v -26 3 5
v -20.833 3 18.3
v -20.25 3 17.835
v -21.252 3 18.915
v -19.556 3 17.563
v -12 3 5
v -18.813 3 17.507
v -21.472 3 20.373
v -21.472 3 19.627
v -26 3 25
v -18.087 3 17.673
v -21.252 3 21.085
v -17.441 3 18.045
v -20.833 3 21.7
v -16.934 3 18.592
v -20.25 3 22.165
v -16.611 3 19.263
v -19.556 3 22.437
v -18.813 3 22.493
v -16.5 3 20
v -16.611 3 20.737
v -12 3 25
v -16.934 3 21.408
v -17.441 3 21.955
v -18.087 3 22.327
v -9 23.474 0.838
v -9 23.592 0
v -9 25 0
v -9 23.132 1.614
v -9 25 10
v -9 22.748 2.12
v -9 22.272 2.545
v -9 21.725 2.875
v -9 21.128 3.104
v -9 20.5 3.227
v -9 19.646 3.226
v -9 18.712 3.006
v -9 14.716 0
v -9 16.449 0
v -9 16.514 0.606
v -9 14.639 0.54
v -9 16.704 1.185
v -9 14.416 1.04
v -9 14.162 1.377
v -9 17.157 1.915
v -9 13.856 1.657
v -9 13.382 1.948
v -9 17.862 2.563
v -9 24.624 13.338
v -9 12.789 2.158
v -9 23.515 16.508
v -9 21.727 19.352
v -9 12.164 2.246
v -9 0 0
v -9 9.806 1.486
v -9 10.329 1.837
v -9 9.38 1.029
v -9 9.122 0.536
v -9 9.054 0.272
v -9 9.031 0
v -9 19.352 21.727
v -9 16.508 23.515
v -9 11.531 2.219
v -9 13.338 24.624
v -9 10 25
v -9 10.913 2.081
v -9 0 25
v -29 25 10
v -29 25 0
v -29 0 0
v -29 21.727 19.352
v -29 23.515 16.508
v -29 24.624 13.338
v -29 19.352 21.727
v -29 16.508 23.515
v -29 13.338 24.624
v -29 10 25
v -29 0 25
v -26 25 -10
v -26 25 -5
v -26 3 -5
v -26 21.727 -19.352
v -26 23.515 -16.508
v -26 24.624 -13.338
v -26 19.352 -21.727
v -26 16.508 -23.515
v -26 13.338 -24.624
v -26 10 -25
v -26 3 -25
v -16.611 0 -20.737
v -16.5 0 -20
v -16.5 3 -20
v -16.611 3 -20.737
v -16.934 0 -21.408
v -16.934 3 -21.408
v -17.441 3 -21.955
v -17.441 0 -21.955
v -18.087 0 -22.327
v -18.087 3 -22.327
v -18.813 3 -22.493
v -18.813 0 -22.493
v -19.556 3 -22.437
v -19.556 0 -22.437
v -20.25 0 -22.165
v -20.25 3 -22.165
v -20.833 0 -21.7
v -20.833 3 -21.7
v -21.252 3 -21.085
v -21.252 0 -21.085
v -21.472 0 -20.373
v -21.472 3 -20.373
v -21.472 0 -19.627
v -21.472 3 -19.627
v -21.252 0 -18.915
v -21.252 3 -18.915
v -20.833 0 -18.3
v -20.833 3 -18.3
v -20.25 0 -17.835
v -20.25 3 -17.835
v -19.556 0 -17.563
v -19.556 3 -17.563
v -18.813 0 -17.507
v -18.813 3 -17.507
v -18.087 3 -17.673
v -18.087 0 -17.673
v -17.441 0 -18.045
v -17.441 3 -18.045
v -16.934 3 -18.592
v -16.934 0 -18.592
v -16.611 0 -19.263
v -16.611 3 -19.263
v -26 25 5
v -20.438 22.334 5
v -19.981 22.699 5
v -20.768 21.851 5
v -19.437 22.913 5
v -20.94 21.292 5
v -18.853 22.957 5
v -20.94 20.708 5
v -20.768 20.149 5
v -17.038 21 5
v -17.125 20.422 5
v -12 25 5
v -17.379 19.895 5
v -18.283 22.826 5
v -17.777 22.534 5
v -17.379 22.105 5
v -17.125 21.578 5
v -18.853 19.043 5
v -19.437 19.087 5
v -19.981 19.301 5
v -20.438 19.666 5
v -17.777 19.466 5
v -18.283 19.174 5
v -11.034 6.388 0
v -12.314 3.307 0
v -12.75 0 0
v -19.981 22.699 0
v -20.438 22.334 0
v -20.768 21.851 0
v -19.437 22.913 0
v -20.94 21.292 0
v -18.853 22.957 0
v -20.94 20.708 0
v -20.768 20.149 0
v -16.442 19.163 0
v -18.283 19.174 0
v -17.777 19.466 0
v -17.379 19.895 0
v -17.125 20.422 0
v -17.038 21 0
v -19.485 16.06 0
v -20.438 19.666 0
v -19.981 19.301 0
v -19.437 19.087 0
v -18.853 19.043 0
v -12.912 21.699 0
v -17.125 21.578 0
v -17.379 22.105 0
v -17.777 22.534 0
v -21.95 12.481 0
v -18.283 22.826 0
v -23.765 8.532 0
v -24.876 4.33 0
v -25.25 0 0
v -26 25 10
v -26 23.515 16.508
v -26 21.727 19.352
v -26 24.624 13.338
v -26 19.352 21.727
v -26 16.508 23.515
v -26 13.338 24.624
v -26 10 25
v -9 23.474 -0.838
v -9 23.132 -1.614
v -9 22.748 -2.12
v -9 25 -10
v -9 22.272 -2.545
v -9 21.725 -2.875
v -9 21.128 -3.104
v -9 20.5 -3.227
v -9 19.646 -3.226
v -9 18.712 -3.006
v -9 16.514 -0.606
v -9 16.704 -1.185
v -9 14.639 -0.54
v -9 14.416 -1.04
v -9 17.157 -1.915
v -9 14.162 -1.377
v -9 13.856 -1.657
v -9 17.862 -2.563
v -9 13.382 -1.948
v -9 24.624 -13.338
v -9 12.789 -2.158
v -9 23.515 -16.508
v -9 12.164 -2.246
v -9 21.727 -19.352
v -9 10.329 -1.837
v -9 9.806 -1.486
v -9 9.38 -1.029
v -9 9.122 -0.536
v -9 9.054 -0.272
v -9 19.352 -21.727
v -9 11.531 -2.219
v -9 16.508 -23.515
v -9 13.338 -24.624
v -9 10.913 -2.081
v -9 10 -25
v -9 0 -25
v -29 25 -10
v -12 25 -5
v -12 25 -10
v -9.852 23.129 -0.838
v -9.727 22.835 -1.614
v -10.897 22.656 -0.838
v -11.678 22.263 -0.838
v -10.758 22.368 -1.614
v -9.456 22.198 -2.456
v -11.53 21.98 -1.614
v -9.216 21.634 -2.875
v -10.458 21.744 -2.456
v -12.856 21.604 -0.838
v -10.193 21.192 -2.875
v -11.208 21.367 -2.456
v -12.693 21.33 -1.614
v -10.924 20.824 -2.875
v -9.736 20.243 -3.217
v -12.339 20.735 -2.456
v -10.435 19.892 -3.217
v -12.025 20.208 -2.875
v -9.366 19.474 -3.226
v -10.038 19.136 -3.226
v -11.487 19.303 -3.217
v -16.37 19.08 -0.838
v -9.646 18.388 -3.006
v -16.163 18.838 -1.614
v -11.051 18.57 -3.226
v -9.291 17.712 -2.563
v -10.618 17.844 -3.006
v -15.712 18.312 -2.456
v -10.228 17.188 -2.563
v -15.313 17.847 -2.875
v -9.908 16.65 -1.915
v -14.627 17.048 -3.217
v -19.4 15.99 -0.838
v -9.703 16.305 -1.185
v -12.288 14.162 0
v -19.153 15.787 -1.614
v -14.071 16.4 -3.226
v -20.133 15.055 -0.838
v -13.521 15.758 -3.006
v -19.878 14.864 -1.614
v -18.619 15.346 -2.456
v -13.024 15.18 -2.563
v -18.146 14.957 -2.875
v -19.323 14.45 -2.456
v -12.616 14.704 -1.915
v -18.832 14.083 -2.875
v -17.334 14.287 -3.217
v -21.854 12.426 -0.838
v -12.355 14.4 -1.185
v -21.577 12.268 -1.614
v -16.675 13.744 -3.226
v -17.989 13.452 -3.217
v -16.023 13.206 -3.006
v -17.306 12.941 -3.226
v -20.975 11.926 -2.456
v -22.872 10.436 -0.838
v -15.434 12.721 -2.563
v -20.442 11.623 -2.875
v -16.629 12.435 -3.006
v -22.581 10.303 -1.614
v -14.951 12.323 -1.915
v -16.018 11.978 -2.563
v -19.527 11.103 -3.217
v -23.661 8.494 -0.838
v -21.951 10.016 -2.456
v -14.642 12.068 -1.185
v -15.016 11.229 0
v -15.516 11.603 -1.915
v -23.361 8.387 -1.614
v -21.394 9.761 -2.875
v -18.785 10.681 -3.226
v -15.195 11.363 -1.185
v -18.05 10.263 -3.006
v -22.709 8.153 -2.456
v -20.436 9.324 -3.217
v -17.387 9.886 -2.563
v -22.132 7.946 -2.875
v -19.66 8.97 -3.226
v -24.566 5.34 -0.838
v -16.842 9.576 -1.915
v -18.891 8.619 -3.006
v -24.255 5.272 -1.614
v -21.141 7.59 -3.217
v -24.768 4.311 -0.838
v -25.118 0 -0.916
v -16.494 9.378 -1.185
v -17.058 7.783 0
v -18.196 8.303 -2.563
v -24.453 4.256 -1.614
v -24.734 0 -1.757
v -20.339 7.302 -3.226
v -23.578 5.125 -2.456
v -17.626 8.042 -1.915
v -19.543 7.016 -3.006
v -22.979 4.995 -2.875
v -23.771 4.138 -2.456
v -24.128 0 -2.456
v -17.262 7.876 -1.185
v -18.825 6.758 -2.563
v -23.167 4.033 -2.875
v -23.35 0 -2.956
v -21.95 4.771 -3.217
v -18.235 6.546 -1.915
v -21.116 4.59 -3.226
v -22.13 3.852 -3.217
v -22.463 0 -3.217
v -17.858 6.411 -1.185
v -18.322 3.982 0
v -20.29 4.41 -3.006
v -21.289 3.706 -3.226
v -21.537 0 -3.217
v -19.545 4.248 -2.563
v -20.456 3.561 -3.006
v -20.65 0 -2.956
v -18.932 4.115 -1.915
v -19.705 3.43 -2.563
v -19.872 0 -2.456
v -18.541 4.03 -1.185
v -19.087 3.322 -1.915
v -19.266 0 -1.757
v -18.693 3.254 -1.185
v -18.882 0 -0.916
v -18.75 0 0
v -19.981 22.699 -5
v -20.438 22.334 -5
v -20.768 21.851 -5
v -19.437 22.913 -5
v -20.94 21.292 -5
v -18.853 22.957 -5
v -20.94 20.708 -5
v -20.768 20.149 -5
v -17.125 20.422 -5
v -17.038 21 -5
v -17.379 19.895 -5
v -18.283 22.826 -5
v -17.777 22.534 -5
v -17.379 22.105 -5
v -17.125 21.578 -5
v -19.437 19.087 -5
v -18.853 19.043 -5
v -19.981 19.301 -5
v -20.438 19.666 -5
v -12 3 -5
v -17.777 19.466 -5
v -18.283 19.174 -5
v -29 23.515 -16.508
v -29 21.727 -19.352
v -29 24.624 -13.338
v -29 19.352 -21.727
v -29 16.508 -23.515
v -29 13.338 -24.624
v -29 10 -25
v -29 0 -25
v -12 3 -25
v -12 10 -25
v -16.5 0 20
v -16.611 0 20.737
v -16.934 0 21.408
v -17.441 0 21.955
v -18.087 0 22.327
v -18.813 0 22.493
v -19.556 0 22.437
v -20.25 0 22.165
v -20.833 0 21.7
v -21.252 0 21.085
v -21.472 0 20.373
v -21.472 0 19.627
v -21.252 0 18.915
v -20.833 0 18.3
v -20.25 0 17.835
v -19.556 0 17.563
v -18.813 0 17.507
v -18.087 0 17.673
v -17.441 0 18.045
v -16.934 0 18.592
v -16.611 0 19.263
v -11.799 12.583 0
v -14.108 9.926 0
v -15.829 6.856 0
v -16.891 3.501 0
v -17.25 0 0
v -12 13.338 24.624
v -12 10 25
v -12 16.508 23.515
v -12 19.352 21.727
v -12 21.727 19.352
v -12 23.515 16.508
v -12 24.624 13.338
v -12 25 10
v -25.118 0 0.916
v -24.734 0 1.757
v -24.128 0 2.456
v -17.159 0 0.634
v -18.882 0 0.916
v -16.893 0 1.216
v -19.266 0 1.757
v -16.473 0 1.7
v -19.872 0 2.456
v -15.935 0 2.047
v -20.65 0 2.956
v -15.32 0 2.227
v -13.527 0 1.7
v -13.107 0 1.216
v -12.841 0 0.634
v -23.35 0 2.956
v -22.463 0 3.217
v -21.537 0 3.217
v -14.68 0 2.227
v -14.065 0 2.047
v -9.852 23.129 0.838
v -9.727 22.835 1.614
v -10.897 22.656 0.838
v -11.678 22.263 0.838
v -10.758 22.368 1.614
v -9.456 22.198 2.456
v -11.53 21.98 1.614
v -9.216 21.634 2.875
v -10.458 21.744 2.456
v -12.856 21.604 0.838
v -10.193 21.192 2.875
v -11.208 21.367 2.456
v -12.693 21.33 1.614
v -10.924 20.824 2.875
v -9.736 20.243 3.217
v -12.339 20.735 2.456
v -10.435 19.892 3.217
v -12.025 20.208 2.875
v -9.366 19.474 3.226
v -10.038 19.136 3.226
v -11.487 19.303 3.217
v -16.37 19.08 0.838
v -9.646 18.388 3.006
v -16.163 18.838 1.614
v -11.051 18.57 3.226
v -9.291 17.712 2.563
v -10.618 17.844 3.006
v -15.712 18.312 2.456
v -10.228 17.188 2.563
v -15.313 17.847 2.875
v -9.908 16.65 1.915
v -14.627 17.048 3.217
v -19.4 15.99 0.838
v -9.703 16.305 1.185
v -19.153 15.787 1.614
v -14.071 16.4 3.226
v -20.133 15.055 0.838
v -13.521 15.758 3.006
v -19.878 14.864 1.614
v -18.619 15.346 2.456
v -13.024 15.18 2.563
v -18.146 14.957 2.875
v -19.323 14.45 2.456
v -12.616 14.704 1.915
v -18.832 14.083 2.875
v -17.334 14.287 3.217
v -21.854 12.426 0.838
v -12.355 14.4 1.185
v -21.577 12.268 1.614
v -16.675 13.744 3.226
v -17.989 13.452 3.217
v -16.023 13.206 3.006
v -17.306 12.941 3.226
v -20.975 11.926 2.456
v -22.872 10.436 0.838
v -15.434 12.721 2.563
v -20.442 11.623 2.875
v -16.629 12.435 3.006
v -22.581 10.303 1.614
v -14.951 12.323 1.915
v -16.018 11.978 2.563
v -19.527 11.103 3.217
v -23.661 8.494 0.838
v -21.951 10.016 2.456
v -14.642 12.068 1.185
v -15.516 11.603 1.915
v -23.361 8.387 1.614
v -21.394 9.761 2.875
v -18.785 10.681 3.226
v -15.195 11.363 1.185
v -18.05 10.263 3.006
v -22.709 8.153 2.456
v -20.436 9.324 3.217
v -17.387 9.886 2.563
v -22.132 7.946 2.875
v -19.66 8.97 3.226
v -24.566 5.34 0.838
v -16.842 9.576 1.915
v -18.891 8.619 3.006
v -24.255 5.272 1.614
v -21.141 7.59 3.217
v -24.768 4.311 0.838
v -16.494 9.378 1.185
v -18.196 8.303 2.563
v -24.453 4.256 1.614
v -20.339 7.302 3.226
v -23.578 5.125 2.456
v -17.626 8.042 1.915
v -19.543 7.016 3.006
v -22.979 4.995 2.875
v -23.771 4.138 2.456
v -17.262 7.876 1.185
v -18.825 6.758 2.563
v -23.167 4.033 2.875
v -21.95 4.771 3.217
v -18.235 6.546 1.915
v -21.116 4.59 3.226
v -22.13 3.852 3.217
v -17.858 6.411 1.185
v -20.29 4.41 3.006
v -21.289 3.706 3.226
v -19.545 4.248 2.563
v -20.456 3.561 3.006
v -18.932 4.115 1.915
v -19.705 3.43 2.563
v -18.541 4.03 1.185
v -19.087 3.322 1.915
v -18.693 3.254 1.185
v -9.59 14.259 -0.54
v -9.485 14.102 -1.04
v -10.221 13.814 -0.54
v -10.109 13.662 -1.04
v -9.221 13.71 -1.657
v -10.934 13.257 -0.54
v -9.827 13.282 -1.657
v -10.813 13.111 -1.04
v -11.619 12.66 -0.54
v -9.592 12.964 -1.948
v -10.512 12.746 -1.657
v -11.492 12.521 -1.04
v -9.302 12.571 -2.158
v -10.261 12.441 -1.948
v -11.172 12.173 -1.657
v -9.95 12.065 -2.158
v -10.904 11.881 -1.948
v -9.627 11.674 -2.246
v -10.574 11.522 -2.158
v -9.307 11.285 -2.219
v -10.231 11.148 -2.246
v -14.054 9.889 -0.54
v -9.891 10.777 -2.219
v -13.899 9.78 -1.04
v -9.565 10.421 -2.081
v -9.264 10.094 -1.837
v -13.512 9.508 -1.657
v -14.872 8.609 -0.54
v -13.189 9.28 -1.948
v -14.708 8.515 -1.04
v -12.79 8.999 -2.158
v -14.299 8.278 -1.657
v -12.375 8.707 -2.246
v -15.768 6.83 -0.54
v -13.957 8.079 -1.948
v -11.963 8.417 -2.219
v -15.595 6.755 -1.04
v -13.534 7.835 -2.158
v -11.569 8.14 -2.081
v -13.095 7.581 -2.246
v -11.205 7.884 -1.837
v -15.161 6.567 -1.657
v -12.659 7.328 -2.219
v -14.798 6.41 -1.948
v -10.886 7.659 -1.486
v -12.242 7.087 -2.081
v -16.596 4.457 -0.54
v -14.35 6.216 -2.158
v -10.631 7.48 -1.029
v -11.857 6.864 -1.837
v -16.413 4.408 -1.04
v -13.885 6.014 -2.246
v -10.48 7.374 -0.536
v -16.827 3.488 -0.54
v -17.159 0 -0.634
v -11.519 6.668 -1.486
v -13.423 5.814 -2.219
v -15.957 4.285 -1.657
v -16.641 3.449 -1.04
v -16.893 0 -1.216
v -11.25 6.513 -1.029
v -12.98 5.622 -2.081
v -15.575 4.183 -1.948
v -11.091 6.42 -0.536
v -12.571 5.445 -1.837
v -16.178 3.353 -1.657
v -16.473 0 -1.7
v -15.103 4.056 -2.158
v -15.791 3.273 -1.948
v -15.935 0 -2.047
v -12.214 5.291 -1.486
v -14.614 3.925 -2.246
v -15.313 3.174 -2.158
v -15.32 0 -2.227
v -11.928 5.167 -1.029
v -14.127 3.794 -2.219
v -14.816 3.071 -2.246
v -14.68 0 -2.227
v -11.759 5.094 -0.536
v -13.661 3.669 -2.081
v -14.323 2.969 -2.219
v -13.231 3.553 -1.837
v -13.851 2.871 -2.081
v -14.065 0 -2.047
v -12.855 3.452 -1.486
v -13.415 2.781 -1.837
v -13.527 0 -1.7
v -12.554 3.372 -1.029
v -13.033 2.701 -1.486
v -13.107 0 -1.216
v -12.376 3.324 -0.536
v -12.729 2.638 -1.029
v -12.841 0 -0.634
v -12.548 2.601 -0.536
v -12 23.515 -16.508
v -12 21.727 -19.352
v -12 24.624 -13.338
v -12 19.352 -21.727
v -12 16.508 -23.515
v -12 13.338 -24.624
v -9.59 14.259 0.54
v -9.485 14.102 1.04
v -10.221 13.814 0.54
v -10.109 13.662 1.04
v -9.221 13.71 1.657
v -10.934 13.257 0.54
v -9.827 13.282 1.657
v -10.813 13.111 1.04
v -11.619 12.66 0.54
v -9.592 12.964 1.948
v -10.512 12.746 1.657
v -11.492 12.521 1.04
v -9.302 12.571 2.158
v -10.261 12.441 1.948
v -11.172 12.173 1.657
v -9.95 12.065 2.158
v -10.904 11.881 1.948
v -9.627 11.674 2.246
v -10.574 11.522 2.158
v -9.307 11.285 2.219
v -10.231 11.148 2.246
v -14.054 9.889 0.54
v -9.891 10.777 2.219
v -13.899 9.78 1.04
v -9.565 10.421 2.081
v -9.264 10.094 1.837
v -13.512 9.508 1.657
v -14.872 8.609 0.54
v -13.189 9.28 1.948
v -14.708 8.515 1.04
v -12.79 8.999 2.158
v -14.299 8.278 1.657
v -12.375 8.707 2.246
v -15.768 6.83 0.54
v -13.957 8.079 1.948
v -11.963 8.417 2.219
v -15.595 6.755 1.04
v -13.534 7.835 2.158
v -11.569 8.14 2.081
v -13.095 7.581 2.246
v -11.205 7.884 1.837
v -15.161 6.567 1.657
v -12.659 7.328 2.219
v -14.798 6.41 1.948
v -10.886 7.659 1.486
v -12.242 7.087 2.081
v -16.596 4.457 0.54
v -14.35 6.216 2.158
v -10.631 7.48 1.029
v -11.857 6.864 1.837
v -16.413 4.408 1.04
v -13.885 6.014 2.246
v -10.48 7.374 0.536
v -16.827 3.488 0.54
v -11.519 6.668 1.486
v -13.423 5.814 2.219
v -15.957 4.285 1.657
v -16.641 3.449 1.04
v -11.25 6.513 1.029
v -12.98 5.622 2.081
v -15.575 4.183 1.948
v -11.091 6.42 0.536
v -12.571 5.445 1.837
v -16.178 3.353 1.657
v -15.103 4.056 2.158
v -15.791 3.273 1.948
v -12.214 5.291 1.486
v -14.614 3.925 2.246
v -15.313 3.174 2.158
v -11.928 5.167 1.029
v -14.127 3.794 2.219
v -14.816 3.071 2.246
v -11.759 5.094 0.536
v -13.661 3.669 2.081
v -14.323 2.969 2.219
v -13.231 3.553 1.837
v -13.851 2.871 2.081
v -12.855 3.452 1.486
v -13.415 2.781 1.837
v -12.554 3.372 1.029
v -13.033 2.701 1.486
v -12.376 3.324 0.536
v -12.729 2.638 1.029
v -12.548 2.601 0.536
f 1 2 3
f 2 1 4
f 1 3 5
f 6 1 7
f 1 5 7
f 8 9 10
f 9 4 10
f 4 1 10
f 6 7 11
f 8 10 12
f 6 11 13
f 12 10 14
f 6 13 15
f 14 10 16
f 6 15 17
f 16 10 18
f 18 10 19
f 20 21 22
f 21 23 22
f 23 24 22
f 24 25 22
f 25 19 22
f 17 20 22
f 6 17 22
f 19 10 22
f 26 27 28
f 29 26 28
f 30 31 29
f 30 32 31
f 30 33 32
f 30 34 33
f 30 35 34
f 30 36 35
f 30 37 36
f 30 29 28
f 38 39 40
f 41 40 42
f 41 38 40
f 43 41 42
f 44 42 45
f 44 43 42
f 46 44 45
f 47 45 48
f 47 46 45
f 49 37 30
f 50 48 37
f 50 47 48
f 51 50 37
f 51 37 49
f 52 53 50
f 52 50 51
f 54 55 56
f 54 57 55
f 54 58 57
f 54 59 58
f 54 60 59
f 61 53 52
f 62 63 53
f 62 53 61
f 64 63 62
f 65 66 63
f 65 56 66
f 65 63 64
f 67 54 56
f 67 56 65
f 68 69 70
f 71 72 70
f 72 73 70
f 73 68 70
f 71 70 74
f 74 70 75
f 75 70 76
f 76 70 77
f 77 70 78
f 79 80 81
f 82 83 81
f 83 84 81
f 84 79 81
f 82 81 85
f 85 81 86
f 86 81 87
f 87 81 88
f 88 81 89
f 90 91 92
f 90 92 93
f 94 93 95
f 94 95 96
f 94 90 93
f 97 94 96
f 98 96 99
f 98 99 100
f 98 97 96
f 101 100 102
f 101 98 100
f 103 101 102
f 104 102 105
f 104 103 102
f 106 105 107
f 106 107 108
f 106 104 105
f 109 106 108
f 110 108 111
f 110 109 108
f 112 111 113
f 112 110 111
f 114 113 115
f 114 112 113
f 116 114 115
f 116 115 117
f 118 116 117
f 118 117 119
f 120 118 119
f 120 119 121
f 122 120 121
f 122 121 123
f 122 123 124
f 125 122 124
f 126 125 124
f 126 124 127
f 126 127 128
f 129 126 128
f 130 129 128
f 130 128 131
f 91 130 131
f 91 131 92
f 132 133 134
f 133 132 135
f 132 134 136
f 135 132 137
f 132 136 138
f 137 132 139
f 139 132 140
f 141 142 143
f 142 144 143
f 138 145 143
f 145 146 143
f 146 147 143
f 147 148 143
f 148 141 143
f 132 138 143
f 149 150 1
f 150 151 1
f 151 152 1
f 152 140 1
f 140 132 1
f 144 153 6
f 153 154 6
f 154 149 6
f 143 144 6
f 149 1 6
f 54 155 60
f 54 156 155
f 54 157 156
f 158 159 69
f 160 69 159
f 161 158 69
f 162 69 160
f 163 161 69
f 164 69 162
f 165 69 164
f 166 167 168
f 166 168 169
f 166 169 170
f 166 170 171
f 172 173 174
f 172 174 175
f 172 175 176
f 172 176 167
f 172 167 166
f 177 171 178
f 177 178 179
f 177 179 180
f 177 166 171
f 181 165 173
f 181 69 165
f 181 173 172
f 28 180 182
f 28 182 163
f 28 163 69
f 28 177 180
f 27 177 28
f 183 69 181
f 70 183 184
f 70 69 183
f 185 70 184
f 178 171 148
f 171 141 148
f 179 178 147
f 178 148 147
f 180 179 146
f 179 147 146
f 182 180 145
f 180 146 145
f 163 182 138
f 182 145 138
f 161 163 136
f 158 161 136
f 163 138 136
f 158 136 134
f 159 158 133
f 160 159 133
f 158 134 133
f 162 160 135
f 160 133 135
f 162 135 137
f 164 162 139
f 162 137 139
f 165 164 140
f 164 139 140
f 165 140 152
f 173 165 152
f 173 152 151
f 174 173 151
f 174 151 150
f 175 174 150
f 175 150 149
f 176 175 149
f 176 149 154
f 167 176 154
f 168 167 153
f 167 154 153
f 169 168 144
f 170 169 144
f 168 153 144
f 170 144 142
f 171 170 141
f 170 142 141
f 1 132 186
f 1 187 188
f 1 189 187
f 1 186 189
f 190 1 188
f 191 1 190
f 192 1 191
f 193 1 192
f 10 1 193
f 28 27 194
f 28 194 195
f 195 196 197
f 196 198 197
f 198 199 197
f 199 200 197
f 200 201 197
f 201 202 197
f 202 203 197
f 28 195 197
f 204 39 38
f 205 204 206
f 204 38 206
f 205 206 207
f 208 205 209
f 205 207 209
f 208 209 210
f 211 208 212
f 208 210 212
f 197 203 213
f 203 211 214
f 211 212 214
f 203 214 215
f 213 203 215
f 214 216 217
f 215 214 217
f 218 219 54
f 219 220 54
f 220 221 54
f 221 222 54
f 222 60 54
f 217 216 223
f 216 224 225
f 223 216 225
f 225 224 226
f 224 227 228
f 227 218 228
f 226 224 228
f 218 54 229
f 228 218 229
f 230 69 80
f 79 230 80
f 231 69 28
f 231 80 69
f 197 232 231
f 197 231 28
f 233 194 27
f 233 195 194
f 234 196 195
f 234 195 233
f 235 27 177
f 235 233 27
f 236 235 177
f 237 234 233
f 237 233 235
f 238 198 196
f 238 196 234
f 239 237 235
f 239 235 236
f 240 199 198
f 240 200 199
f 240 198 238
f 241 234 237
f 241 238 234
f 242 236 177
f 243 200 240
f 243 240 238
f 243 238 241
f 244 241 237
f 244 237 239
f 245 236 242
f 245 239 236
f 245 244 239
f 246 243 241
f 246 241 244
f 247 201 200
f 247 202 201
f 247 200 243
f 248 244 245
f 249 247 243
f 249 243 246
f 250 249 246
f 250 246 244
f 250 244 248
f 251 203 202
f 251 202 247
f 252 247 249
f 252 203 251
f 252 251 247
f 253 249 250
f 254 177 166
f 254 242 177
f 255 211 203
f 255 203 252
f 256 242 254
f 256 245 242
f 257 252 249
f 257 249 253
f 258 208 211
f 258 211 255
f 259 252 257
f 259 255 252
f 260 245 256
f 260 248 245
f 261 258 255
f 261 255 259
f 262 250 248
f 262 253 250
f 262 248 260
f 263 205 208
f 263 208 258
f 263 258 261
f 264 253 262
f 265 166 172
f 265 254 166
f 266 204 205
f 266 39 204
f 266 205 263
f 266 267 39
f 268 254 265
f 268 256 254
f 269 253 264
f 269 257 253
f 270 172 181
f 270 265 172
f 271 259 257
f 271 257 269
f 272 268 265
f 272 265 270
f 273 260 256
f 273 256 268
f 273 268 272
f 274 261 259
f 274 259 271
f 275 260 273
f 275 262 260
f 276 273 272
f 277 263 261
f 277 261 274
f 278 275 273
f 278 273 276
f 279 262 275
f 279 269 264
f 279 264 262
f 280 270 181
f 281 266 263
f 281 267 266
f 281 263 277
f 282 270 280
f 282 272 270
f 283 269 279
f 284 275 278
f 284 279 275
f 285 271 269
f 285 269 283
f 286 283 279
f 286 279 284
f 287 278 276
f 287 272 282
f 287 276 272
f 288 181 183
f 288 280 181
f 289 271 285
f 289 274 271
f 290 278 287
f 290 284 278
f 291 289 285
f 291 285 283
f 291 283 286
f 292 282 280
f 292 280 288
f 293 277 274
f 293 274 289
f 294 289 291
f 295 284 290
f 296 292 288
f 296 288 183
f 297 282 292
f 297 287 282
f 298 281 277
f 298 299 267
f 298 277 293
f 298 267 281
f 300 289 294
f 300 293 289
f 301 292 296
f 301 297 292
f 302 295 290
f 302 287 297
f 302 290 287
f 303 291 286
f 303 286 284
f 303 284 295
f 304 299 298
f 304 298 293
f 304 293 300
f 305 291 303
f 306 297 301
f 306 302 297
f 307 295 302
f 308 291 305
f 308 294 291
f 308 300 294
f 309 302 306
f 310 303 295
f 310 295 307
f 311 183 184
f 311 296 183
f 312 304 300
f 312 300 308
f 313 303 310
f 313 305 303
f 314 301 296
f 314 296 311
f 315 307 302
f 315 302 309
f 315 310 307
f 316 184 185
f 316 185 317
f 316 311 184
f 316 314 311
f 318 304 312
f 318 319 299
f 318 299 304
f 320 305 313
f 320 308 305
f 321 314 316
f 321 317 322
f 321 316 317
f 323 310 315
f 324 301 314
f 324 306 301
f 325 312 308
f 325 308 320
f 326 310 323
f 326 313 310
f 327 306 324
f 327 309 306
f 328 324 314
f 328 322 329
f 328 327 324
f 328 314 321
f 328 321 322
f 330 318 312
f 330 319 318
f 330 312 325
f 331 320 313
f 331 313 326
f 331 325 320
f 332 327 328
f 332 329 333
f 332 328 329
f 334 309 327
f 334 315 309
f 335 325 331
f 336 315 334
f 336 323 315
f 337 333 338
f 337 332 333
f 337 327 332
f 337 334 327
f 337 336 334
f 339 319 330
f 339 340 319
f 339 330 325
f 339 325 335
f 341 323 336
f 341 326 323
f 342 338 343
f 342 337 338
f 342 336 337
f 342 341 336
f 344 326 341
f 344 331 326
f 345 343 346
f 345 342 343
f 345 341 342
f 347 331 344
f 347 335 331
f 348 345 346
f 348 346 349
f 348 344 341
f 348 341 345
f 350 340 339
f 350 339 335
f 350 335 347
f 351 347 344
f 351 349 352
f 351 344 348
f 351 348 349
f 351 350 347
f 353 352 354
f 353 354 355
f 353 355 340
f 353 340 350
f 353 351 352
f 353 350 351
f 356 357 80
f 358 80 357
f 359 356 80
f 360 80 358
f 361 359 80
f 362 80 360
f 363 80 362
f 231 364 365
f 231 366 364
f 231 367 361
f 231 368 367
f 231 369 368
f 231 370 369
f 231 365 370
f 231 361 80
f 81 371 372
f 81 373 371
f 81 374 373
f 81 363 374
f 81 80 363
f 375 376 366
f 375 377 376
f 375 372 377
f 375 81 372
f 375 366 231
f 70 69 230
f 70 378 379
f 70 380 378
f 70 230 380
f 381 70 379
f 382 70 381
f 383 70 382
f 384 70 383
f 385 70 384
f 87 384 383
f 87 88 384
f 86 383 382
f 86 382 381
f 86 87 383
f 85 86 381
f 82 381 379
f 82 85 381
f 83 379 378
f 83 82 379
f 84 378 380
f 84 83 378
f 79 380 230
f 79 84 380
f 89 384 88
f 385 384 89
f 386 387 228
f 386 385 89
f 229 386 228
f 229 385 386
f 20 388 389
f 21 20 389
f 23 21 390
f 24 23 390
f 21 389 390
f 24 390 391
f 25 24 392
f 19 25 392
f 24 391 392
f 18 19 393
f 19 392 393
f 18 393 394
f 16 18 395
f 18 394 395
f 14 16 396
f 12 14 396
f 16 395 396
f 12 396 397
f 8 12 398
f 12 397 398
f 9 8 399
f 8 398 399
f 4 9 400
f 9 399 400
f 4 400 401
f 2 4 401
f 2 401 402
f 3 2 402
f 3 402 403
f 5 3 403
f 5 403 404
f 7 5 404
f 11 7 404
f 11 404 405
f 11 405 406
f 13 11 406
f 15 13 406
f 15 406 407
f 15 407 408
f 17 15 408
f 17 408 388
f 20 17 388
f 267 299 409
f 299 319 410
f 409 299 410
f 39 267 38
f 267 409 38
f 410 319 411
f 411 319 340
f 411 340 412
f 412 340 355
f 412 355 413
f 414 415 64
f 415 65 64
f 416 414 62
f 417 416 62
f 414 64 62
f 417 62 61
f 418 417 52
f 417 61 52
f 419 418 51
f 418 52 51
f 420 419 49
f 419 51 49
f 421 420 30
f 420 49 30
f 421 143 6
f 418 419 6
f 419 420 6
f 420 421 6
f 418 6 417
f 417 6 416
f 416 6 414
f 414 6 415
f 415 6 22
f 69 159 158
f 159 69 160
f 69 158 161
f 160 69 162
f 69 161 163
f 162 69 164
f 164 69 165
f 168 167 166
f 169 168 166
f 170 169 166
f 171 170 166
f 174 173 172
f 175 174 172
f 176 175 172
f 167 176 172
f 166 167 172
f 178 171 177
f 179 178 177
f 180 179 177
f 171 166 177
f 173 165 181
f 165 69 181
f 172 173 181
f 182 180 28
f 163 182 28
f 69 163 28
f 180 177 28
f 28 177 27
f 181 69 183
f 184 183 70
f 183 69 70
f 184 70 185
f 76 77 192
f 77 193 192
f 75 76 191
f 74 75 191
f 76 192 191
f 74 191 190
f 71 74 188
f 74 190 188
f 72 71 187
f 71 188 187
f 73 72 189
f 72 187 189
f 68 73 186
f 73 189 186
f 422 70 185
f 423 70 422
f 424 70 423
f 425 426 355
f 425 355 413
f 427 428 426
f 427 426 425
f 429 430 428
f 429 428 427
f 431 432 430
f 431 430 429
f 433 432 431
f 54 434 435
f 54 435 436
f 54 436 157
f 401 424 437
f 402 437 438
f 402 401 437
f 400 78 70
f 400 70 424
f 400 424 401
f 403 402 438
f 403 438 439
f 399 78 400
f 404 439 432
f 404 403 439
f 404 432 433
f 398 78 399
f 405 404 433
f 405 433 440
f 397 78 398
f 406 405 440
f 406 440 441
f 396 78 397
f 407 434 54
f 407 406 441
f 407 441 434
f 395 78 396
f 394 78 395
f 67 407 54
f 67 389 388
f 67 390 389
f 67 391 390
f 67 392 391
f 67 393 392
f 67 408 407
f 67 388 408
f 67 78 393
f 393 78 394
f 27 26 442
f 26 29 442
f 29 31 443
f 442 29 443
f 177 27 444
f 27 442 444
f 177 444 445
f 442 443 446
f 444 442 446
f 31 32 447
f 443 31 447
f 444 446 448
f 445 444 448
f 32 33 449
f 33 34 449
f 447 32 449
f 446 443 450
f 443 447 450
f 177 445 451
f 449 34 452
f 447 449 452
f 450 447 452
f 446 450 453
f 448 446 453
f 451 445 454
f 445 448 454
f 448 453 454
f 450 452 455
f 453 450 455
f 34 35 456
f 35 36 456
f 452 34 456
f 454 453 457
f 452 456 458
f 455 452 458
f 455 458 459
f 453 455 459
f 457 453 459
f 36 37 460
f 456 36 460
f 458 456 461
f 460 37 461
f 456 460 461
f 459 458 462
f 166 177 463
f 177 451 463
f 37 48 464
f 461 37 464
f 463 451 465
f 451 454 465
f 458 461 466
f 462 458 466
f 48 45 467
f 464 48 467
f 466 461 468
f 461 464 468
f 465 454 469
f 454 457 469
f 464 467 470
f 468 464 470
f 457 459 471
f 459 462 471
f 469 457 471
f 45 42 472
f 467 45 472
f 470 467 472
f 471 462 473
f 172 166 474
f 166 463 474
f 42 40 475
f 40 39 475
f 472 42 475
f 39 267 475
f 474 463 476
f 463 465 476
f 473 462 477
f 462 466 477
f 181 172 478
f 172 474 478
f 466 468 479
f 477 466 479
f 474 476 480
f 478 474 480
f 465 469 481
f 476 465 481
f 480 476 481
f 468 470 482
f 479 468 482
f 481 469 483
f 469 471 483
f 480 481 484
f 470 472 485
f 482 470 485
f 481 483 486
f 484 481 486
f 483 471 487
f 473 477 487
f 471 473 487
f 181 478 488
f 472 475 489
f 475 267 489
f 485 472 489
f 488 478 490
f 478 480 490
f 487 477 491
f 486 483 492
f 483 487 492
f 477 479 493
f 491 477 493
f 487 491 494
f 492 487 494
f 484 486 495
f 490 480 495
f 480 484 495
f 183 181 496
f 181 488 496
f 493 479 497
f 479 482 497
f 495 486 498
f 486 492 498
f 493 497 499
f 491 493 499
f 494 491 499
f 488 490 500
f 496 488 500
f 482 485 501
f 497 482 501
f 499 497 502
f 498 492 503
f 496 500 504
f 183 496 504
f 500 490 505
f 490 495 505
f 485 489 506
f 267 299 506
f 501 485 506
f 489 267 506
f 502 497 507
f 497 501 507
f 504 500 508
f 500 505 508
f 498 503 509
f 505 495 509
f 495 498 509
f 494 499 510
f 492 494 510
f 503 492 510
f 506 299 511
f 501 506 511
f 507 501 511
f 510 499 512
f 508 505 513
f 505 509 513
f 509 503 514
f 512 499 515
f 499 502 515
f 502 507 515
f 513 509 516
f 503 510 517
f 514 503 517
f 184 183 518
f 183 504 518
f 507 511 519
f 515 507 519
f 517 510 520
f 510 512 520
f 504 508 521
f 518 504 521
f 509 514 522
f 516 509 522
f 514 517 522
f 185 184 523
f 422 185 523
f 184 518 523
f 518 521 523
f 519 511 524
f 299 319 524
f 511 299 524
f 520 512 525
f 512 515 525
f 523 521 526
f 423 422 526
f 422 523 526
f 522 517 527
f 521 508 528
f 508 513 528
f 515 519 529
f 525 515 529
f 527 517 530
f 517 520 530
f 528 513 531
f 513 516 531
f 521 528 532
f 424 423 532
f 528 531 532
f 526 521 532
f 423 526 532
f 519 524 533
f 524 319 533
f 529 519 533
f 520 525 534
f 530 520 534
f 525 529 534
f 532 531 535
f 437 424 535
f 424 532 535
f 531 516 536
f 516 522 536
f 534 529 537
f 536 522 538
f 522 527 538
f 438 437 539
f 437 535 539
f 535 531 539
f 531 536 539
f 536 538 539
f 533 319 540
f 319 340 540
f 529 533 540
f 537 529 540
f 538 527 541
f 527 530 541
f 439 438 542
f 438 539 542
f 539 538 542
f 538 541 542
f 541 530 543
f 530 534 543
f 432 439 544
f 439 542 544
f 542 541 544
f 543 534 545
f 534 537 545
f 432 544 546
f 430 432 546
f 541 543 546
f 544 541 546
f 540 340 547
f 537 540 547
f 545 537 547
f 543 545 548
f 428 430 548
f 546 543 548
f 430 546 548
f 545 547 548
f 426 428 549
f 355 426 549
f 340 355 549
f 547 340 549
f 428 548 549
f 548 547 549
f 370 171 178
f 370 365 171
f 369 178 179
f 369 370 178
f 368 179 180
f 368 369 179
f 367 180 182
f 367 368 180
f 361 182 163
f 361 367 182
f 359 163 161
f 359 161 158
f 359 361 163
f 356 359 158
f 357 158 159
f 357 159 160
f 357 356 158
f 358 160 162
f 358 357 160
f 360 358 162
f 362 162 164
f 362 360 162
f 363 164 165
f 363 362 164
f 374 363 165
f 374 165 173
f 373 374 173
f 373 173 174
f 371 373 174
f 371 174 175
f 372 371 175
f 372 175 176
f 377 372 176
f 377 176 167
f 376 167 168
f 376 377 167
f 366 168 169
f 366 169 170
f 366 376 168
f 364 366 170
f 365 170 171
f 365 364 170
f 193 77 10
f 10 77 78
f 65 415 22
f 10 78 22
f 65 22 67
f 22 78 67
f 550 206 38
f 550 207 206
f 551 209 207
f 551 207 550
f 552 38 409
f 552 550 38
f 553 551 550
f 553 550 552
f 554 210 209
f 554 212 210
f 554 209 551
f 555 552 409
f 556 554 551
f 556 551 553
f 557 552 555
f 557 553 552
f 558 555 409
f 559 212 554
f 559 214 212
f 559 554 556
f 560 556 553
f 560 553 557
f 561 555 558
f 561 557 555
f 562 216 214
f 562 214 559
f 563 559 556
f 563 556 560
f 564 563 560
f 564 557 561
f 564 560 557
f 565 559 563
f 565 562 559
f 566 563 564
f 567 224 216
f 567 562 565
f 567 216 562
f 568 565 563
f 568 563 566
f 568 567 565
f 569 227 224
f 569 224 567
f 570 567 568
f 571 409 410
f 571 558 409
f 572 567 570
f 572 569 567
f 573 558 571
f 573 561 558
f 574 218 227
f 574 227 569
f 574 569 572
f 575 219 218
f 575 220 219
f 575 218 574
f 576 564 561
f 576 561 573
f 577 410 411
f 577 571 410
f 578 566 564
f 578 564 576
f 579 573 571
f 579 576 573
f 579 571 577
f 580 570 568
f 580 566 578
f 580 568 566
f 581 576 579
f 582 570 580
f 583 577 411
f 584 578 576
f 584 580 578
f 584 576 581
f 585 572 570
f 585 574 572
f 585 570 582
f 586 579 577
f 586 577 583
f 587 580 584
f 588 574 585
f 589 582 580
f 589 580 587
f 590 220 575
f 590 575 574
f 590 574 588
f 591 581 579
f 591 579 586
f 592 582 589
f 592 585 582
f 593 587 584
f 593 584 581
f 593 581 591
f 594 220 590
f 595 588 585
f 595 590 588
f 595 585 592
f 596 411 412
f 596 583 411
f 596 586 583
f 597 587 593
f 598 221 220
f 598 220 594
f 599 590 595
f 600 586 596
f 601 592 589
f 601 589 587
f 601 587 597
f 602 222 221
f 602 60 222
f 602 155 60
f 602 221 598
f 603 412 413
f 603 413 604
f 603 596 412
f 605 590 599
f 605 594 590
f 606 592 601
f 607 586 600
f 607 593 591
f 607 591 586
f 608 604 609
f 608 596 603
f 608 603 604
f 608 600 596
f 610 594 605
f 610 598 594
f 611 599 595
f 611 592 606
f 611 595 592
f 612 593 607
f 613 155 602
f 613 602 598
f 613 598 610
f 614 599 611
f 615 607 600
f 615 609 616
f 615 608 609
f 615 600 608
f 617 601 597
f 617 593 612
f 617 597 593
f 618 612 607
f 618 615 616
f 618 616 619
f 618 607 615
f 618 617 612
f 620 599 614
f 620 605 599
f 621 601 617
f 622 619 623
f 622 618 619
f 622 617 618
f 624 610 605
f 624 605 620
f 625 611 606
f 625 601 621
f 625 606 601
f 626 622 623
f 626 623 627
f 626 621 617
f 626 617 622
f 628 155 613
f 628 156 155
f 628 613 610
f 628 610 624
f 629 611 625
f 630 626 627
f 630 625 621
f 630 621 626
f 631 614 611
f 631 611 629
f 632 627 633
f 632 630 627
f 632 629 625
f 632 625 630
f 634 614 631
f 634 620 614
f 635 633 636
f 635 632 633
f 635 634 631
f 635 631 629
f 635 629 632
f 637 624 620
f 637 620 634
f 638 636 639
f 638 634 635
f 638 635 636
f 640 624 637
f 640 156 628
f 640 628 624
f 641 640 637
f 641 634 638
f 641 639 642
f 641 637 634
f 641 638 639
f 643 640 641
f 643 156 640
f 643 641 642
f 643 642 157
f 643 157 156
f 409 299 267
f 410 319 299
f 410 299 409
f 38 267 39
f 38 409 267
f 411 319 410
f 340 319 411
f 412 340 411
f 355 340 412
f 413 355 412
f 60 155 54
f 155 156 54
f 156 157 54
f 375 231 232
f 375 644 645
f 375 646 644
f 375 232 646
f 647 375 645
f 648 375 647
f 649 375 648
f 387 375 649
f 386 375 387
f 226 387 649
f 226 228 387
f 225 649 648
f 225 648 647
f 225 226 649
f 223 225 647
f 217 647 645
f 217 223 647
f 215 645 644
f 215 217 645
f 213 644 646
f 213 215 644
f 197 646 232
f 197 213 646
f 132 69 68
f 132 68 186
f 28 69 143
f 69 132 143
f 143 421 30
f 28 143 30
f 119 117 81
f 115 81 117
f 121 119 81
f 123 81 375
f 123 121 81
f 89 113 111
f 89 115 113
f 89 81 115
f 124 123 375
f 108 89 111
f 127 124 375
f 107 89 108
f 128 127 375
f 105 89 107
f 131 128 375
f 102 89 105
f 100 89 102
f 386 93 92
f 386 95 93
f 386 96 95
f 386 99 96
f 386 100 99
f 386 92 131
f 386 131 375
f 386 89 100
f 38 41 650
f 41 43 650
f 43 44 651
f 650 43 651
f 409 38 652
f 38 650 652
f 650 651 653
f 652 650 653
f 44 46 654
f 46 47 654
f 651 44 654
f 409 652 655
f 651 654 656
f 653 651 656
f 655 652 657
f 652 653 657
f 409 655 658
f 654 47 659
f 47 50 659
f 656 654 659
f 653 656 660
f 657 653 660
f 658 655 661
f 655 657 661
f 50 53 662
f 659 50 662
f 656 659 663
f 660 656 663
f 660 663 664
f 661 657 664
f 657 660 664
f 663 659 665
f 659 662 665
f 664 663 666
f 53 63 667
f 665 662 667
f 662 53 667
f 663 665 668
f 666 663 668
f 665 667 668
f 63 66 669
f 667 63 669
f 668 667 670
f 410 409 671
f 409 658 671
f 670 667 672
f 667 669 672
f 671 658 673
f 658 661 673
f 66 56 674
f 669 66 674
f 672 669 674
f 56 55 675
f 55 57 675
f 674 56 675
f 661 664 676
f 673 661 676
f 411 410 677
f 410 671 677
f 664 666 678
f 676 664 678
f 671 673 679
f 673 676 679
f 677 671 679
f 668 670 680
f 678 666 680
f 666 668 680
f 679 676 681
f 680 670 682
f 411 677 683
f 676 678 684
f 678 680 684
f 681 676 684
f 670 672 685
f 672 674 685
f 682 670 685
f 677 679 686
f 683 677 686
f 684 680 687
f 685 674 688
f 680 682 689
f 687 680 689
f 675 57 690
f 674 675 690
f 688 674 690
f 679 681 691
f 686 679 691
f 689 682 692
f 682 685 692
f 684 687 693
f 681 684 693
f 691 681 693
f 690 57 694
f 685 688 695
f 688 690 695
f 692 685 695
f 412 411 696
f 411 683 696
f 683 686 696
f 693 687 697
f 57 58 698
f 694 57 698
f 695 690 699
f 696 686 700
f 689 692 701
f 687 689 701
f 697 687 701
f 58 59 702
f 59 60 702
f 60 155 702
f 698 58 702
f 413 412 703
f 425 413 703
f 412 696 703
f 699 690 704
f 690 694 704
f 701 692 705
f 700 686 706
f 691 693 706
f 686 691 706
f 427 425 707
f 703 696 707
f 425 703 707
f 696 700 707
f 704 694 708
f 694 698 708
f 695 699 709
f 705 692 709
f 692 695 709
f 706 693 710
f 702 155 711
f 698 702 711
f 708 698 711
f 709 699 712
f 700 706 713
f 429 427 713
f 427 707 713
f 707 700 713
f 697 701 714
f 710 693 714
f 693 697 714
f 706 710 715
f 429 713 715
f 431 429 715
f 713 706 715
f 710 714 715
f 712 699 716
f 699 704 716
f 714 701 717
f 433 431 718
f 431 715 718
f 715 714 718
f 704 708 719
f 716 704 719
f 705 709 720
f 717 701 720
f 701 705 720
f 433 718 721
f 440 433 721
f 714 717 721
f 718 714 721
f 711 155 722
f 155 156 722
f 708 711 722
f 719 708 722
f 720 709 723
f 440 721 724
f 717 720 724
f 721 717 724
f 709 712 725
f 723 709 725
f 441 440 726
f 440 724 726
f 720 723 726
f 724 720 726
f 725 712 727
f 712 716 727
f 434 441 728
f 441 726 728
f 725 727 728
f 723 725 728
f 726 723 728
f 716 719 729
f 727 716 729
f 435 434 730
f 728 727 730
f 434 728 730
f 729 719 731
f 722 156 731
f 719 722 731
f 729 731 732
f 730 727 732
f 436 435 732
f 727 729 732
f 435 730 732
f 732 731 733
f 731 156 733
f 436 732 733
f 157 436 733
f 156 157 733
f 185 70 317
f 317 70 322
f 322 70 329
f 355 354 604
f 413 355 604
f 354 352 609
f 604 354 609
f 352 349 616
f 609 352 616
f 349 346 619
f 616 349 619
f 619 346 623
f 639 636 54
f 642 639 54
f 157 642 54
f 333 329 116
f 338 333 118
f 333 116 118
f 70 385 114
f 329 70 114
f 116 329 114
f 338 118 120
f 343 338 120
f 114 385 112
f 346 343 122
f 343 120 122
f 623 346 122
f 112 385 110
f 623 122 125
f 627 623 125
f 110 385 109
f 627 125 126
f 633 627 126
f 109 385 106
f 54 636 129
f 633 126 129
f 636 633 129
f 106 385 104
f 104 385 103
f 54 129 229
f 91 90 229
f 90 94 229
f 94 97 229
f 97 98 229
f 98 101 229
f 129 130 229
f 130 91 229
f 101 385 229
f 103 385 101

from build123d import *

# Parameters (mm, degrees)
F2_W           = 20
F2_H           = 50
F3_DEPTH       = 25
F5_START       = -3
F4_W           = 14
F4_H           = 21
F5_DEPTH       = 22.001
F1_R           = 3.25
F6_ANGLE       = 90
F1_R_2         = 2.25
F7_ANGLE       = 90
F8_R           = 2.5
F9_DEPTH       = 25
F10_R          = 1.9619906376
F11_DEPTH      = 25
F11_DEPTH_BACK = 25
F12_W          = 35.8874800149
F12_H          = 25.5419854075
F13_DEPTH      = 25
F14_R          = 15


with BuildPart() as f3:
    # F2 (on Front) → F3 (new body)
    with BuildSketch(Plane.XZ):
        with Locations((-19, 0)):
            Rectangle(F2_W, F2_H)
    extrude(amount=-F3_DEPTH)

    # F4 (on Front) → F5 (cut)
    with BuildSketch(Plane.XZ.offset(F5_START)):
        with Locations((-19, 15.5)):
            Rectangle(F4_W, F4_H)
    extrude(amount=-F5_DEPTH, mode=Mode.SUBTRACT)

    # F1 (on Right) → F6 (revolve, cut)
    with BuildSketch(Plane.YZ):
        with Locations((22, 0)):
            Circle(F1_R)
    revolve(axis=Axis((0, 0, 0), (0, 0, 1)), revolution_arc=F6_ANGLE, mode=Mode.SUBTRACT)

    # F1 (on Right) → F7 (revolve, cut)
    with BuildSketch(Plane.YZ):
        with Locations((15, 0)):
            Circle(F1_R_2)
    revolve(axis=Axis((0, 0, 0), (0, 0, 1)), revolution_arc=F7_ANGLE, mode=Mode.SUBTRACT)

    # F8 (on Front) → F9 (cut)
    with BuildSketch(Plane.XZ):
        with Locations((-19, 20)):
            Circle(F8_R)
    extrude(amount=-F9_DEPTH, mode=Mode.SUBTRACT)

    # F10 (on Top) → F11 (cut, two sides)
    with BuildSketch(Plane.XY) as f11_sk:
        with Locations((-19, 21)):
            Circle(F10_R)
    extrude(amount=-F11_DEPTH, mode=Mode.SUBTRACT)
    extrude(f11_sk.sketch, amount=F11_DEPTH_BACK, mode=Mode.SUBTRACT)

    # F12 (on Front) → F13 (cut)
    with BuildSketch(Plane.XZ):
        with Locations((-20.9509915439, -12.7709927037)):
            Rectangle(F12_W, F12_H)
    extrude(amount=-F13_DEPTH, mode=Mode.SUBTRACT)

    # F14
    f14_edges = [f3.edges().sort_by_distance(p)[0] for p in [
        (-10.5, 25, 25),
        (-27.5, 25, 25),
    ]]
    fillet(f14_edges, radius=F14_R)


with BuildPart() as f15_1:
    # F15: instance of F3
    add(f3.part.mirror(Plane.XY))


solid = Compound([f3.part, f15_1.part])
